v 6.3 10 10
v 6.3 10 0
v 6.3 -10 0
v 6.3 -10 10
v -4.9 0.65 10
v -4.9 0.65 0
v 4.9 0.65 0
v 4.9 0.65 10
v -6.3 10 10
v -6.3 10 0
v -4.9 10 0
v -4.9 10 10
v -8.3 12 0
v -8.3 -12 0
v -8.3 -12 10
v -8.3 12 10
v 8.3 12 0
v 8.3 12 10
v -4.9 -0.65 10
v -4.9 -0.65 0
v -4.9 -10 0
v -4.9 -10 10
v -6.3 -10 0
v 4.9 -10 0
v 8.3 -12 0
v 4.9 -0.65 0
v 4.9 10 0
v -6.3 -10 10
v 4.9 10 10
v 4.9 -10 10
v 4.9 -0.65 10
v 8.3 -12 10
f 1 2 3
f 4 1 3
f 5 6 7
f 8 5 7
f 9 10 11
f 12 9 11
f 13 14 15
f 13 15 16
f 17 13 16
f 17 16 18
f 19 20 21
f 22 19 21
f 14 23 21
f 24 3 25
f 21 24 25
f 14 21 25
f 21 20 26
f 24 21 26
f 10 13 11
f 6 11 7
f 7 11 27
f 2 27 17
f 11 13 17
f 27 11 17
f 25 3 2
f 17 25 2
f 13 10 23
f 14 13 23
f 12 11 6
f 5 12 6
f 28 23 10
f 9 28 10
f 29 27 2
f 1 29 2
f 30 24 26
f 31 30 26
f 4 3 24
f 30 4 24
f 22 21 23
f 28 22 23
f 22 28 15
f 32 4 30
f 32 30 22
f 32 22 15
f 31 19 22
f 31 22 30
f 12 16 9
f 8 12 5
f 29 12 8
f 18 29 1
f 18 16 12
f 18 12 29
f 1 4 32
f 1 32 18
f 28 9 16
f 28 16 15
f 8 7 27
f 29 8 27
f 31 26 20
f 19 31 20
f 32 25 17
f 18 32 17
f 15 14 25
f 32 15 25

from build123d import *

# Parameters (mm, degrees)
SKETCH1_W           = 16.6
SKETCH1_H           = 24
BOSS_EXTRUDE1_DEPTH = 10


with BuildPart() as part:
    # Sketch1 → Boss-Extrude1 (new body)
    with BuildSketch(Plane.XY):
        Rectangle(SKETCH1_W, SKETCH1_H)
        Polygon((-4.9, 10), (-4.9, 0.65), (4.9, 0.65), (4.9, 10), (6.3, 10), (6.3, -10), (4.9, -10), (4.9, -0.65), (-4.9, -0.65), (-4.9, -10), (-6.3, -10), (-6.3, 10), align=None, mode=Mode.SUBTRACT)
    extrude(amount=BOSS_EXTRUDE1_DEPTH)


solid = part.part
